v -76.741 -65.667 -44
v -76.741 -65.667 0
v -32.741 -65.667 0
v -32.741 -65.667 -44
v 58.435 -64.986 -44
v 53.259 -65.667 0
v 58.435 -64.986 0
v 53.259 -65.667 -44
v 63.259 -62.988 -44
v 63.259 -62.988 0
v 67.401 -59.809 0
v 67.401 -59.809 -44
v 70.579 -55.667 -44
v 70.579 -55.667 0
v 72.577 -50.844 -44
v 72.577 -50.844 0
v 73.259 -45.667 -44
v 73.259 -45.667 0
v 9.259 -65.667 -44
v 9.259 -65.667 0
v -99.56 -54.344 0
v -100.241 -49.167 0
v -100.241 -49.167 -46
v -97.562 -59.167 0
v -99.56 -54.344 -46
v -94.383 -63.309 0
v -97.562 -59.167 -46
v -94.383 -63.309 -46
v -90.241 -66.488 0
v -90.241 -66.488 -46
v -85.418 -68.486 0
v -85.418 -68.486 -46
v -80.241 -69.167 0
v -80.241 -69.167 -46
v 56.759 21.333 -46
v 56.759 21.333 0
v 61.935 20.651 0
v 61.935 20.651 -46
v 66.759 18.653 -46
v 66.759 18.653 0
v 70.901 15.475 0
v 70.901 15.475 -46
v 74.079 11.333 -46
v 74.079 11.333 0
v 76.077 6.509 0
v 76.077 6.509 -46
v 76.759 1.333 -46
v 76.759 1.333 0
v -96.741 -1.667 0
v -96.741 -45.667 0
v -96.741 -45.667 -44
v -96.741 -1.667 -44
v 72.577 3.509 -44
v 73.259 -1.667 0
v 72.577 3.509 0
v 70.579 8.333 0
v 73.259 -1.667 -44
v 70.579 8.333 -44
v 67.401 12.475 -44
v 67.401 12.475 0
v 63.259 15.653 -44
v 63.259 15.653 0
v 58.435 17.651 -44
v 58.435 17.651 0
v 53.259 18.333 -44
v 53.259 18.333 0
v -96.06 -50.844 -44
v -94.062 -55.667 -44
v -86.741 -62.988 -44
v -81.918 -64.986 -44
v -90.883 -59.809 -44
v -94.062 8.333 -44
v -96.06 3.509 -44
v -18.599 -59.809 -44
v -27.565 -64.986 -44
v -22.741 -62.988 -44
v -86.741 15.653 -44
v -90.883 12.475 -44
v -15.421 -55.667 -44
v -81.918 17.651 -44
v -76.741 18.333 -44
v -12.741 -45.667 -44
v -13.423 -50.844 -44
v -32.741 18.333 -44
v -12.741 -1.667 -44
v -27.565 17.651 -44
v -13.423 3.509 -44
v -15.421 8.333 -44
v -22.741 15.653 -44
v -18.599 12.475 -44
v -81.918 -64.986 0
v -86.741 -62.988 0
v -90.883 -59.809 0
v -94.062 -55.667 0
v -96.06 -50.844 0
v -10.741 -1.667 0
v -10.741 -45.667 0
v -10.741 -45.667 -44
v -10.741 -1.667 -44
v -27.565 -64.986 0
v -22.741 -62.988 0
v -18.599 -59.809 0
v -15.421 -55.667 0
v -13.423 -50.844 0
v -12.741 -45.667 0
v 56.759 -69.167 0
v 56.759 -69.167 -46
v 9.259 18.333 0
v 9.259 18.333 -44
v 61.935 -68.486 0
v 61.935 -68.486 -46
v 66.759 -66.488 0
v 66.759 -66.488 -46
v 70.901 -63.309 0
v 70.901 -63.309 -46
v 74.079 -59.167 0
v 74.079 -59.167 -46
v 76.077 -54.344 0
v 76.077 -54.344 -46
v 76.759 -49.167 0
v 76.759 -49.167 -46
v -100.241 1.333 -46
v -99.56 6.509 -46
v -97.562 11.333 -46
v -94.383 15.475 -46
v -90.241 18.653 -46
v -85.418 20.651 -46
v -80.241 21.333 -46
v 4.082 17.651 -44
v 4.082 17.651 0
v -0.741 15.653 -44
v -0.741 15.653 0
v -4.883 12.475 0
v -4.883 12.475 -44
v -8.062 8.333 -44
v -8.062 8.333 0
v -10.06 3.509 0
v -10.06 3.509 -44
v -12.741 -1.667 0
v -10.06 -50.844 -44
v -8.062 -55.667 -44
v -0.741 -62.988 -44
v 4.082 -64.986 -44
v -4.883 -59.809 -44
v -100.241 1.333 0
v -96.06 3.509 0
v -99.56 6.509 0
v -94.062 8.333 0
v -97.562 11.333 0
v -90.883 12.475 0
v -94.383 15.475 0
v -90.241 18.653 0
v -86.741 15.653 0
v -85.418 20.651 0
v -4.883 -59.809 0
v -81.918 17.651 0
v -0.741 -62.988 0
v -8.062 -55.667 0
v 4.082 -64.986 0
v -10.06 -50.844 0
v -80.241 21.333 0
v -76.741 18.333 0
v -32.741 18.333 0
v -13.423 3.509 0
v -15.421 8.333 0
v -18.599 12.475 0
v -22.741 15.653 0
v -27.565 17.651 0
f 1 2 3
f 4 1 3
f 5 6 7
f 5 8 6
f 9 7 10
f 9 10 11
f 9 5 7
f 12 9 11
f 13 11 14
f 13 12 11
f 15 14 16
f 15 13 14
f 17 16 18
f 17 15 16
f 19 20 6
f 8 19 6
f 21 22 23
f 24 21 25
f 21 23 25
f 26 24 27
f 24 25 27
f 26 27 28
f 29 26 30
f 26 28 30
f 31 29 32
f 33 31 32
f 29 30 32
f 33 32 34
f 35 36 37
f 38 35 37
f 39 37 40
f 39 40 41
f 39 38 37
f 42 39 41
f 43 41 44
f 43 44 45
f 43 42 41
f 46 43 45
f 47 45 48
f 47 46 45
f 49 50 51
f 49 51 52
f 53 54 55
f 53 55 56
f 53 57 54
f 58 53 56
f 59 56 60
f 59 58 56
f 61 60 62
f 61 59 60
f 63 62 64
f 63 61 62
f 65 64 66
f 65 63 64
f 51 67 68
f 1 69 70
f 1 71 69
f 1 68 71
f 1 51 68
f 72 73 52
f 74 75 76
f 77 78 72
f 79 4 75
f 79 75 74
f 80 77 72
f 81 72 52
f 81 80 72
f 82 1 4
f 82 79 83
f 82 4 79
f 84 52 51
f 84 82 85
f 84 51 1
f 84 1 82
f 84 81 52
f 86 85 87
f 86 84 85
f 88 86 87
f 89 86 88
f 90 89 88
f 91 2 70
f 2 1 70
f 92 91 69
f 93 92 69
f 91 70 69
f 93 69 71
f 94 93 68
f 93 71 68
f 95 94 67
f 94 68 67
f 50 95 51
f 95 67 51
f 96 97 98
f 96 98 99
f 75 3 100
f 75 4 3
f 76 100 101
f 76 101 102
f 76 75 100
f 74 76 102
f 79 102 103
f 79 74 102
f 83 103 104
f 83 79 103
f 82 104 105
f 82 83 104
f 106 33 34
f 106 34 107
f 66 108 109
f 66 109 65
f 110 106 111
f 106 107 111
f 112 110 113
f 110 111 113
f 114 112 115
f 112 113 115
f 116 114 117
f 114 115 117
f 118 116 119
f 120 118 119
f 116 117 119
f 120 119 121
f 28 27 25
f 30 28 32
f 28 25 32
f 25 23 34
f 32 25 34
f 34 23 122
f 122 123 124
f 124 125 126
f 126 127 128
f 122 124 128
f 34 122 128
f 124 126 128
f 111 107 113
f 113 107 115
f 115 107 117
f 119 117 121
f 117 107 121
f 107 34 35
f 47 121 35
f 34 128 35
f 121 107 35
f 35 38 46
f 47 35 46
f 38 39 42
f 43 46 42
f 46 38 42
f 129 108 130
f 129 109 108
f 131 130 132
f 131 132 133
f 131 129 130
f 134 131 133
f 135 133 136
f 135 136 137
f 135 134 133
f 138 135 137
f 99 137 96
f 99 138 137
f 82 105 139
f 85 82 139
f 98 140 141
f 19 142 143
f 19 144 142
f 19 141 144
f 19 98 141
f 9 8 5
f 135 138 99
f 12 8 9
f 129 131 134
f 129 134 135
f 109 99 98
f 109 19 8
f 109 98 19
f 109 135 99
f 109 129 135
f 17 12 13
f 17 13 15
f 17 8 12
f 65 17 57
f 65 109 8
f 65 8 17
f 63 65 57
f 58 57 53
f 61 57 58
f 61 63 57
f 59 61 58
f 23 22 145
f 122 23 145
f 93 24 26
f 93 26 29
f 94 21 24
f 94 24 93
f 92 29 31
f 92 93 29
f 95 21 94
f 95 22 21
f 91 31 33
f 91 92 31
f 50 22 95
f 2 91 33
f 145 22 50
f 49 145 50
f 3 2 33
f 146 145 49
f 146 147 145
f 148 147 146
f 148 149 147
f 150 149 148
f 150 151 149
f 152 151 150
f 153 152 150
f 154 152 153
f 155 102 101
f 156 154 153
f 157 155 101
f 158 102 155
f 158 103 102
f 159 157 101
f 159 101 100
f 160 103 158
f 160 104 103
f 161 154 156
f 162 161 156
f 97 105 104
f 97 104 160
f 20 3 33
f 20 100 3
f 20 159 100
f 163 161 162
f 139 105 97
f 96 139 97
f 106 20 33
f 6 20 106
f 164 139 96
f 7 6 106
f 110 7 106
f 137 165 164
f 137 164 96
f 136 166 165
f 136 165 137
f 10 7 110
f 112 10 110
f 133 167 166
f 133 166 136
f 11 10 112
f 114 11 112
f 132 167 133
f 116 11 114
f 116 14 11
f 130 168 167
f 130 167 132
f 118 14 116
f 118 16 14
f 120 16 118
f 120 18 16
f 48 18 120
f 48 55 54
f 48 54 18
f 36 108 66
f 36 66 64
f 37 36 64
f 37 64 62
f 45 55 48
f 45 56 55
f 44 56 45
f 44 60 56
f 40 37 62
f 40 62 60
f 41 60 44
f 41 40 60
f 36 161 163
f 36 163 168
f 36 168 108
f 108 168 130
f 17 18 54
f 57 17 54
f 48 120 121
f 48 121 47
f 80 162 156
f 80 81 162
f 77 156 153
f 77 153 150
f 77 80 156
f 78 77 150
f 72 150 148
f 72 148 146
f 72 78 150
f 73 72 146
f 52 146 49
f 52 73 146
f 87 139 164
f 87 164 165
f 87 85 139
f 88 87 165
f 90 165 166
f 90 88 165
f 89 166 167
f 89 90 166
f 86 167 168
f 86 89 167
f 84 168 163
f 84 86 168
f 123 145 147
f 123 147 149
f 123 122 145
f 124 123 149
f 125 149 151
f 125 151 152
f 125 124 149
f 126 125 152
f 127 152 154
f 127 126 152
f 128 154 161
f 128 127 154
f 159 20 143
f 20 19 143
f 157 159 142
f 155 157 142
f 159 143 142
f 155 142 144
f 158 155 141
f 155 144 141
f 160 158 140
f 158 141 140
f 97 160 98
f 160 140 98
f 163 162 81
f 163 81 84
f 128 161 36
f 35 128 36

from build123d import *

# Parameters (mm, degrees)
F0_W     = 177
F0_H     = 90.5
F1_DEPTH = 46
F2_W     = 84
F2_H     = 84
F3_DEPTH = 44
F4_R     = 20


with BuildPart() as f1:
    # F0 (on Top) → F1 (new body)
    with BuildSketch(Plane.XY):
        with Locations((-11.741341, -23.917309)):
            Rectangle(F0_W, F0_H)
    extrude(amount=-F1_DEPTH)

    # F2 (on face) → F3 (cut)
    with BuildSketch(Plane.XY):
        with Locations((-54.741341, -23.667309)):
            Rectangle(F2_W, F2_H)
        with Locations((31.258659, -23.667309)):
            Rectangle(F2_W, F2_H)
    extrude(amount=-F3_DEPTH, mode=Mode.SUBTRACT)

    # F4
    f4_edges = [f1.edges().sort_by_distance(p)[0] for p in [
        (-96.741341, 18.332691, -22),
        (-96.741341, -65.667309, -22),
        (-12.741341, -65.667309, -22),
        (-12.741341, 18.332691, -22),
        (-10.741341, 18.332691, -22),
        (-10.741341, -65.667309, -22),
        (73.258659, 18.332691, -22),
        (73.258659, -65.667309, -22),
        (76.758659, 21.332691, -23),
        (-100.241341, 21.332691, -23),
        (-100.241341, -69.167309, -23),
        (76.758659, -69.167309, -23),
    ]]
    fillet(f4_edges, radius=F4_R)


solid = f1.part
